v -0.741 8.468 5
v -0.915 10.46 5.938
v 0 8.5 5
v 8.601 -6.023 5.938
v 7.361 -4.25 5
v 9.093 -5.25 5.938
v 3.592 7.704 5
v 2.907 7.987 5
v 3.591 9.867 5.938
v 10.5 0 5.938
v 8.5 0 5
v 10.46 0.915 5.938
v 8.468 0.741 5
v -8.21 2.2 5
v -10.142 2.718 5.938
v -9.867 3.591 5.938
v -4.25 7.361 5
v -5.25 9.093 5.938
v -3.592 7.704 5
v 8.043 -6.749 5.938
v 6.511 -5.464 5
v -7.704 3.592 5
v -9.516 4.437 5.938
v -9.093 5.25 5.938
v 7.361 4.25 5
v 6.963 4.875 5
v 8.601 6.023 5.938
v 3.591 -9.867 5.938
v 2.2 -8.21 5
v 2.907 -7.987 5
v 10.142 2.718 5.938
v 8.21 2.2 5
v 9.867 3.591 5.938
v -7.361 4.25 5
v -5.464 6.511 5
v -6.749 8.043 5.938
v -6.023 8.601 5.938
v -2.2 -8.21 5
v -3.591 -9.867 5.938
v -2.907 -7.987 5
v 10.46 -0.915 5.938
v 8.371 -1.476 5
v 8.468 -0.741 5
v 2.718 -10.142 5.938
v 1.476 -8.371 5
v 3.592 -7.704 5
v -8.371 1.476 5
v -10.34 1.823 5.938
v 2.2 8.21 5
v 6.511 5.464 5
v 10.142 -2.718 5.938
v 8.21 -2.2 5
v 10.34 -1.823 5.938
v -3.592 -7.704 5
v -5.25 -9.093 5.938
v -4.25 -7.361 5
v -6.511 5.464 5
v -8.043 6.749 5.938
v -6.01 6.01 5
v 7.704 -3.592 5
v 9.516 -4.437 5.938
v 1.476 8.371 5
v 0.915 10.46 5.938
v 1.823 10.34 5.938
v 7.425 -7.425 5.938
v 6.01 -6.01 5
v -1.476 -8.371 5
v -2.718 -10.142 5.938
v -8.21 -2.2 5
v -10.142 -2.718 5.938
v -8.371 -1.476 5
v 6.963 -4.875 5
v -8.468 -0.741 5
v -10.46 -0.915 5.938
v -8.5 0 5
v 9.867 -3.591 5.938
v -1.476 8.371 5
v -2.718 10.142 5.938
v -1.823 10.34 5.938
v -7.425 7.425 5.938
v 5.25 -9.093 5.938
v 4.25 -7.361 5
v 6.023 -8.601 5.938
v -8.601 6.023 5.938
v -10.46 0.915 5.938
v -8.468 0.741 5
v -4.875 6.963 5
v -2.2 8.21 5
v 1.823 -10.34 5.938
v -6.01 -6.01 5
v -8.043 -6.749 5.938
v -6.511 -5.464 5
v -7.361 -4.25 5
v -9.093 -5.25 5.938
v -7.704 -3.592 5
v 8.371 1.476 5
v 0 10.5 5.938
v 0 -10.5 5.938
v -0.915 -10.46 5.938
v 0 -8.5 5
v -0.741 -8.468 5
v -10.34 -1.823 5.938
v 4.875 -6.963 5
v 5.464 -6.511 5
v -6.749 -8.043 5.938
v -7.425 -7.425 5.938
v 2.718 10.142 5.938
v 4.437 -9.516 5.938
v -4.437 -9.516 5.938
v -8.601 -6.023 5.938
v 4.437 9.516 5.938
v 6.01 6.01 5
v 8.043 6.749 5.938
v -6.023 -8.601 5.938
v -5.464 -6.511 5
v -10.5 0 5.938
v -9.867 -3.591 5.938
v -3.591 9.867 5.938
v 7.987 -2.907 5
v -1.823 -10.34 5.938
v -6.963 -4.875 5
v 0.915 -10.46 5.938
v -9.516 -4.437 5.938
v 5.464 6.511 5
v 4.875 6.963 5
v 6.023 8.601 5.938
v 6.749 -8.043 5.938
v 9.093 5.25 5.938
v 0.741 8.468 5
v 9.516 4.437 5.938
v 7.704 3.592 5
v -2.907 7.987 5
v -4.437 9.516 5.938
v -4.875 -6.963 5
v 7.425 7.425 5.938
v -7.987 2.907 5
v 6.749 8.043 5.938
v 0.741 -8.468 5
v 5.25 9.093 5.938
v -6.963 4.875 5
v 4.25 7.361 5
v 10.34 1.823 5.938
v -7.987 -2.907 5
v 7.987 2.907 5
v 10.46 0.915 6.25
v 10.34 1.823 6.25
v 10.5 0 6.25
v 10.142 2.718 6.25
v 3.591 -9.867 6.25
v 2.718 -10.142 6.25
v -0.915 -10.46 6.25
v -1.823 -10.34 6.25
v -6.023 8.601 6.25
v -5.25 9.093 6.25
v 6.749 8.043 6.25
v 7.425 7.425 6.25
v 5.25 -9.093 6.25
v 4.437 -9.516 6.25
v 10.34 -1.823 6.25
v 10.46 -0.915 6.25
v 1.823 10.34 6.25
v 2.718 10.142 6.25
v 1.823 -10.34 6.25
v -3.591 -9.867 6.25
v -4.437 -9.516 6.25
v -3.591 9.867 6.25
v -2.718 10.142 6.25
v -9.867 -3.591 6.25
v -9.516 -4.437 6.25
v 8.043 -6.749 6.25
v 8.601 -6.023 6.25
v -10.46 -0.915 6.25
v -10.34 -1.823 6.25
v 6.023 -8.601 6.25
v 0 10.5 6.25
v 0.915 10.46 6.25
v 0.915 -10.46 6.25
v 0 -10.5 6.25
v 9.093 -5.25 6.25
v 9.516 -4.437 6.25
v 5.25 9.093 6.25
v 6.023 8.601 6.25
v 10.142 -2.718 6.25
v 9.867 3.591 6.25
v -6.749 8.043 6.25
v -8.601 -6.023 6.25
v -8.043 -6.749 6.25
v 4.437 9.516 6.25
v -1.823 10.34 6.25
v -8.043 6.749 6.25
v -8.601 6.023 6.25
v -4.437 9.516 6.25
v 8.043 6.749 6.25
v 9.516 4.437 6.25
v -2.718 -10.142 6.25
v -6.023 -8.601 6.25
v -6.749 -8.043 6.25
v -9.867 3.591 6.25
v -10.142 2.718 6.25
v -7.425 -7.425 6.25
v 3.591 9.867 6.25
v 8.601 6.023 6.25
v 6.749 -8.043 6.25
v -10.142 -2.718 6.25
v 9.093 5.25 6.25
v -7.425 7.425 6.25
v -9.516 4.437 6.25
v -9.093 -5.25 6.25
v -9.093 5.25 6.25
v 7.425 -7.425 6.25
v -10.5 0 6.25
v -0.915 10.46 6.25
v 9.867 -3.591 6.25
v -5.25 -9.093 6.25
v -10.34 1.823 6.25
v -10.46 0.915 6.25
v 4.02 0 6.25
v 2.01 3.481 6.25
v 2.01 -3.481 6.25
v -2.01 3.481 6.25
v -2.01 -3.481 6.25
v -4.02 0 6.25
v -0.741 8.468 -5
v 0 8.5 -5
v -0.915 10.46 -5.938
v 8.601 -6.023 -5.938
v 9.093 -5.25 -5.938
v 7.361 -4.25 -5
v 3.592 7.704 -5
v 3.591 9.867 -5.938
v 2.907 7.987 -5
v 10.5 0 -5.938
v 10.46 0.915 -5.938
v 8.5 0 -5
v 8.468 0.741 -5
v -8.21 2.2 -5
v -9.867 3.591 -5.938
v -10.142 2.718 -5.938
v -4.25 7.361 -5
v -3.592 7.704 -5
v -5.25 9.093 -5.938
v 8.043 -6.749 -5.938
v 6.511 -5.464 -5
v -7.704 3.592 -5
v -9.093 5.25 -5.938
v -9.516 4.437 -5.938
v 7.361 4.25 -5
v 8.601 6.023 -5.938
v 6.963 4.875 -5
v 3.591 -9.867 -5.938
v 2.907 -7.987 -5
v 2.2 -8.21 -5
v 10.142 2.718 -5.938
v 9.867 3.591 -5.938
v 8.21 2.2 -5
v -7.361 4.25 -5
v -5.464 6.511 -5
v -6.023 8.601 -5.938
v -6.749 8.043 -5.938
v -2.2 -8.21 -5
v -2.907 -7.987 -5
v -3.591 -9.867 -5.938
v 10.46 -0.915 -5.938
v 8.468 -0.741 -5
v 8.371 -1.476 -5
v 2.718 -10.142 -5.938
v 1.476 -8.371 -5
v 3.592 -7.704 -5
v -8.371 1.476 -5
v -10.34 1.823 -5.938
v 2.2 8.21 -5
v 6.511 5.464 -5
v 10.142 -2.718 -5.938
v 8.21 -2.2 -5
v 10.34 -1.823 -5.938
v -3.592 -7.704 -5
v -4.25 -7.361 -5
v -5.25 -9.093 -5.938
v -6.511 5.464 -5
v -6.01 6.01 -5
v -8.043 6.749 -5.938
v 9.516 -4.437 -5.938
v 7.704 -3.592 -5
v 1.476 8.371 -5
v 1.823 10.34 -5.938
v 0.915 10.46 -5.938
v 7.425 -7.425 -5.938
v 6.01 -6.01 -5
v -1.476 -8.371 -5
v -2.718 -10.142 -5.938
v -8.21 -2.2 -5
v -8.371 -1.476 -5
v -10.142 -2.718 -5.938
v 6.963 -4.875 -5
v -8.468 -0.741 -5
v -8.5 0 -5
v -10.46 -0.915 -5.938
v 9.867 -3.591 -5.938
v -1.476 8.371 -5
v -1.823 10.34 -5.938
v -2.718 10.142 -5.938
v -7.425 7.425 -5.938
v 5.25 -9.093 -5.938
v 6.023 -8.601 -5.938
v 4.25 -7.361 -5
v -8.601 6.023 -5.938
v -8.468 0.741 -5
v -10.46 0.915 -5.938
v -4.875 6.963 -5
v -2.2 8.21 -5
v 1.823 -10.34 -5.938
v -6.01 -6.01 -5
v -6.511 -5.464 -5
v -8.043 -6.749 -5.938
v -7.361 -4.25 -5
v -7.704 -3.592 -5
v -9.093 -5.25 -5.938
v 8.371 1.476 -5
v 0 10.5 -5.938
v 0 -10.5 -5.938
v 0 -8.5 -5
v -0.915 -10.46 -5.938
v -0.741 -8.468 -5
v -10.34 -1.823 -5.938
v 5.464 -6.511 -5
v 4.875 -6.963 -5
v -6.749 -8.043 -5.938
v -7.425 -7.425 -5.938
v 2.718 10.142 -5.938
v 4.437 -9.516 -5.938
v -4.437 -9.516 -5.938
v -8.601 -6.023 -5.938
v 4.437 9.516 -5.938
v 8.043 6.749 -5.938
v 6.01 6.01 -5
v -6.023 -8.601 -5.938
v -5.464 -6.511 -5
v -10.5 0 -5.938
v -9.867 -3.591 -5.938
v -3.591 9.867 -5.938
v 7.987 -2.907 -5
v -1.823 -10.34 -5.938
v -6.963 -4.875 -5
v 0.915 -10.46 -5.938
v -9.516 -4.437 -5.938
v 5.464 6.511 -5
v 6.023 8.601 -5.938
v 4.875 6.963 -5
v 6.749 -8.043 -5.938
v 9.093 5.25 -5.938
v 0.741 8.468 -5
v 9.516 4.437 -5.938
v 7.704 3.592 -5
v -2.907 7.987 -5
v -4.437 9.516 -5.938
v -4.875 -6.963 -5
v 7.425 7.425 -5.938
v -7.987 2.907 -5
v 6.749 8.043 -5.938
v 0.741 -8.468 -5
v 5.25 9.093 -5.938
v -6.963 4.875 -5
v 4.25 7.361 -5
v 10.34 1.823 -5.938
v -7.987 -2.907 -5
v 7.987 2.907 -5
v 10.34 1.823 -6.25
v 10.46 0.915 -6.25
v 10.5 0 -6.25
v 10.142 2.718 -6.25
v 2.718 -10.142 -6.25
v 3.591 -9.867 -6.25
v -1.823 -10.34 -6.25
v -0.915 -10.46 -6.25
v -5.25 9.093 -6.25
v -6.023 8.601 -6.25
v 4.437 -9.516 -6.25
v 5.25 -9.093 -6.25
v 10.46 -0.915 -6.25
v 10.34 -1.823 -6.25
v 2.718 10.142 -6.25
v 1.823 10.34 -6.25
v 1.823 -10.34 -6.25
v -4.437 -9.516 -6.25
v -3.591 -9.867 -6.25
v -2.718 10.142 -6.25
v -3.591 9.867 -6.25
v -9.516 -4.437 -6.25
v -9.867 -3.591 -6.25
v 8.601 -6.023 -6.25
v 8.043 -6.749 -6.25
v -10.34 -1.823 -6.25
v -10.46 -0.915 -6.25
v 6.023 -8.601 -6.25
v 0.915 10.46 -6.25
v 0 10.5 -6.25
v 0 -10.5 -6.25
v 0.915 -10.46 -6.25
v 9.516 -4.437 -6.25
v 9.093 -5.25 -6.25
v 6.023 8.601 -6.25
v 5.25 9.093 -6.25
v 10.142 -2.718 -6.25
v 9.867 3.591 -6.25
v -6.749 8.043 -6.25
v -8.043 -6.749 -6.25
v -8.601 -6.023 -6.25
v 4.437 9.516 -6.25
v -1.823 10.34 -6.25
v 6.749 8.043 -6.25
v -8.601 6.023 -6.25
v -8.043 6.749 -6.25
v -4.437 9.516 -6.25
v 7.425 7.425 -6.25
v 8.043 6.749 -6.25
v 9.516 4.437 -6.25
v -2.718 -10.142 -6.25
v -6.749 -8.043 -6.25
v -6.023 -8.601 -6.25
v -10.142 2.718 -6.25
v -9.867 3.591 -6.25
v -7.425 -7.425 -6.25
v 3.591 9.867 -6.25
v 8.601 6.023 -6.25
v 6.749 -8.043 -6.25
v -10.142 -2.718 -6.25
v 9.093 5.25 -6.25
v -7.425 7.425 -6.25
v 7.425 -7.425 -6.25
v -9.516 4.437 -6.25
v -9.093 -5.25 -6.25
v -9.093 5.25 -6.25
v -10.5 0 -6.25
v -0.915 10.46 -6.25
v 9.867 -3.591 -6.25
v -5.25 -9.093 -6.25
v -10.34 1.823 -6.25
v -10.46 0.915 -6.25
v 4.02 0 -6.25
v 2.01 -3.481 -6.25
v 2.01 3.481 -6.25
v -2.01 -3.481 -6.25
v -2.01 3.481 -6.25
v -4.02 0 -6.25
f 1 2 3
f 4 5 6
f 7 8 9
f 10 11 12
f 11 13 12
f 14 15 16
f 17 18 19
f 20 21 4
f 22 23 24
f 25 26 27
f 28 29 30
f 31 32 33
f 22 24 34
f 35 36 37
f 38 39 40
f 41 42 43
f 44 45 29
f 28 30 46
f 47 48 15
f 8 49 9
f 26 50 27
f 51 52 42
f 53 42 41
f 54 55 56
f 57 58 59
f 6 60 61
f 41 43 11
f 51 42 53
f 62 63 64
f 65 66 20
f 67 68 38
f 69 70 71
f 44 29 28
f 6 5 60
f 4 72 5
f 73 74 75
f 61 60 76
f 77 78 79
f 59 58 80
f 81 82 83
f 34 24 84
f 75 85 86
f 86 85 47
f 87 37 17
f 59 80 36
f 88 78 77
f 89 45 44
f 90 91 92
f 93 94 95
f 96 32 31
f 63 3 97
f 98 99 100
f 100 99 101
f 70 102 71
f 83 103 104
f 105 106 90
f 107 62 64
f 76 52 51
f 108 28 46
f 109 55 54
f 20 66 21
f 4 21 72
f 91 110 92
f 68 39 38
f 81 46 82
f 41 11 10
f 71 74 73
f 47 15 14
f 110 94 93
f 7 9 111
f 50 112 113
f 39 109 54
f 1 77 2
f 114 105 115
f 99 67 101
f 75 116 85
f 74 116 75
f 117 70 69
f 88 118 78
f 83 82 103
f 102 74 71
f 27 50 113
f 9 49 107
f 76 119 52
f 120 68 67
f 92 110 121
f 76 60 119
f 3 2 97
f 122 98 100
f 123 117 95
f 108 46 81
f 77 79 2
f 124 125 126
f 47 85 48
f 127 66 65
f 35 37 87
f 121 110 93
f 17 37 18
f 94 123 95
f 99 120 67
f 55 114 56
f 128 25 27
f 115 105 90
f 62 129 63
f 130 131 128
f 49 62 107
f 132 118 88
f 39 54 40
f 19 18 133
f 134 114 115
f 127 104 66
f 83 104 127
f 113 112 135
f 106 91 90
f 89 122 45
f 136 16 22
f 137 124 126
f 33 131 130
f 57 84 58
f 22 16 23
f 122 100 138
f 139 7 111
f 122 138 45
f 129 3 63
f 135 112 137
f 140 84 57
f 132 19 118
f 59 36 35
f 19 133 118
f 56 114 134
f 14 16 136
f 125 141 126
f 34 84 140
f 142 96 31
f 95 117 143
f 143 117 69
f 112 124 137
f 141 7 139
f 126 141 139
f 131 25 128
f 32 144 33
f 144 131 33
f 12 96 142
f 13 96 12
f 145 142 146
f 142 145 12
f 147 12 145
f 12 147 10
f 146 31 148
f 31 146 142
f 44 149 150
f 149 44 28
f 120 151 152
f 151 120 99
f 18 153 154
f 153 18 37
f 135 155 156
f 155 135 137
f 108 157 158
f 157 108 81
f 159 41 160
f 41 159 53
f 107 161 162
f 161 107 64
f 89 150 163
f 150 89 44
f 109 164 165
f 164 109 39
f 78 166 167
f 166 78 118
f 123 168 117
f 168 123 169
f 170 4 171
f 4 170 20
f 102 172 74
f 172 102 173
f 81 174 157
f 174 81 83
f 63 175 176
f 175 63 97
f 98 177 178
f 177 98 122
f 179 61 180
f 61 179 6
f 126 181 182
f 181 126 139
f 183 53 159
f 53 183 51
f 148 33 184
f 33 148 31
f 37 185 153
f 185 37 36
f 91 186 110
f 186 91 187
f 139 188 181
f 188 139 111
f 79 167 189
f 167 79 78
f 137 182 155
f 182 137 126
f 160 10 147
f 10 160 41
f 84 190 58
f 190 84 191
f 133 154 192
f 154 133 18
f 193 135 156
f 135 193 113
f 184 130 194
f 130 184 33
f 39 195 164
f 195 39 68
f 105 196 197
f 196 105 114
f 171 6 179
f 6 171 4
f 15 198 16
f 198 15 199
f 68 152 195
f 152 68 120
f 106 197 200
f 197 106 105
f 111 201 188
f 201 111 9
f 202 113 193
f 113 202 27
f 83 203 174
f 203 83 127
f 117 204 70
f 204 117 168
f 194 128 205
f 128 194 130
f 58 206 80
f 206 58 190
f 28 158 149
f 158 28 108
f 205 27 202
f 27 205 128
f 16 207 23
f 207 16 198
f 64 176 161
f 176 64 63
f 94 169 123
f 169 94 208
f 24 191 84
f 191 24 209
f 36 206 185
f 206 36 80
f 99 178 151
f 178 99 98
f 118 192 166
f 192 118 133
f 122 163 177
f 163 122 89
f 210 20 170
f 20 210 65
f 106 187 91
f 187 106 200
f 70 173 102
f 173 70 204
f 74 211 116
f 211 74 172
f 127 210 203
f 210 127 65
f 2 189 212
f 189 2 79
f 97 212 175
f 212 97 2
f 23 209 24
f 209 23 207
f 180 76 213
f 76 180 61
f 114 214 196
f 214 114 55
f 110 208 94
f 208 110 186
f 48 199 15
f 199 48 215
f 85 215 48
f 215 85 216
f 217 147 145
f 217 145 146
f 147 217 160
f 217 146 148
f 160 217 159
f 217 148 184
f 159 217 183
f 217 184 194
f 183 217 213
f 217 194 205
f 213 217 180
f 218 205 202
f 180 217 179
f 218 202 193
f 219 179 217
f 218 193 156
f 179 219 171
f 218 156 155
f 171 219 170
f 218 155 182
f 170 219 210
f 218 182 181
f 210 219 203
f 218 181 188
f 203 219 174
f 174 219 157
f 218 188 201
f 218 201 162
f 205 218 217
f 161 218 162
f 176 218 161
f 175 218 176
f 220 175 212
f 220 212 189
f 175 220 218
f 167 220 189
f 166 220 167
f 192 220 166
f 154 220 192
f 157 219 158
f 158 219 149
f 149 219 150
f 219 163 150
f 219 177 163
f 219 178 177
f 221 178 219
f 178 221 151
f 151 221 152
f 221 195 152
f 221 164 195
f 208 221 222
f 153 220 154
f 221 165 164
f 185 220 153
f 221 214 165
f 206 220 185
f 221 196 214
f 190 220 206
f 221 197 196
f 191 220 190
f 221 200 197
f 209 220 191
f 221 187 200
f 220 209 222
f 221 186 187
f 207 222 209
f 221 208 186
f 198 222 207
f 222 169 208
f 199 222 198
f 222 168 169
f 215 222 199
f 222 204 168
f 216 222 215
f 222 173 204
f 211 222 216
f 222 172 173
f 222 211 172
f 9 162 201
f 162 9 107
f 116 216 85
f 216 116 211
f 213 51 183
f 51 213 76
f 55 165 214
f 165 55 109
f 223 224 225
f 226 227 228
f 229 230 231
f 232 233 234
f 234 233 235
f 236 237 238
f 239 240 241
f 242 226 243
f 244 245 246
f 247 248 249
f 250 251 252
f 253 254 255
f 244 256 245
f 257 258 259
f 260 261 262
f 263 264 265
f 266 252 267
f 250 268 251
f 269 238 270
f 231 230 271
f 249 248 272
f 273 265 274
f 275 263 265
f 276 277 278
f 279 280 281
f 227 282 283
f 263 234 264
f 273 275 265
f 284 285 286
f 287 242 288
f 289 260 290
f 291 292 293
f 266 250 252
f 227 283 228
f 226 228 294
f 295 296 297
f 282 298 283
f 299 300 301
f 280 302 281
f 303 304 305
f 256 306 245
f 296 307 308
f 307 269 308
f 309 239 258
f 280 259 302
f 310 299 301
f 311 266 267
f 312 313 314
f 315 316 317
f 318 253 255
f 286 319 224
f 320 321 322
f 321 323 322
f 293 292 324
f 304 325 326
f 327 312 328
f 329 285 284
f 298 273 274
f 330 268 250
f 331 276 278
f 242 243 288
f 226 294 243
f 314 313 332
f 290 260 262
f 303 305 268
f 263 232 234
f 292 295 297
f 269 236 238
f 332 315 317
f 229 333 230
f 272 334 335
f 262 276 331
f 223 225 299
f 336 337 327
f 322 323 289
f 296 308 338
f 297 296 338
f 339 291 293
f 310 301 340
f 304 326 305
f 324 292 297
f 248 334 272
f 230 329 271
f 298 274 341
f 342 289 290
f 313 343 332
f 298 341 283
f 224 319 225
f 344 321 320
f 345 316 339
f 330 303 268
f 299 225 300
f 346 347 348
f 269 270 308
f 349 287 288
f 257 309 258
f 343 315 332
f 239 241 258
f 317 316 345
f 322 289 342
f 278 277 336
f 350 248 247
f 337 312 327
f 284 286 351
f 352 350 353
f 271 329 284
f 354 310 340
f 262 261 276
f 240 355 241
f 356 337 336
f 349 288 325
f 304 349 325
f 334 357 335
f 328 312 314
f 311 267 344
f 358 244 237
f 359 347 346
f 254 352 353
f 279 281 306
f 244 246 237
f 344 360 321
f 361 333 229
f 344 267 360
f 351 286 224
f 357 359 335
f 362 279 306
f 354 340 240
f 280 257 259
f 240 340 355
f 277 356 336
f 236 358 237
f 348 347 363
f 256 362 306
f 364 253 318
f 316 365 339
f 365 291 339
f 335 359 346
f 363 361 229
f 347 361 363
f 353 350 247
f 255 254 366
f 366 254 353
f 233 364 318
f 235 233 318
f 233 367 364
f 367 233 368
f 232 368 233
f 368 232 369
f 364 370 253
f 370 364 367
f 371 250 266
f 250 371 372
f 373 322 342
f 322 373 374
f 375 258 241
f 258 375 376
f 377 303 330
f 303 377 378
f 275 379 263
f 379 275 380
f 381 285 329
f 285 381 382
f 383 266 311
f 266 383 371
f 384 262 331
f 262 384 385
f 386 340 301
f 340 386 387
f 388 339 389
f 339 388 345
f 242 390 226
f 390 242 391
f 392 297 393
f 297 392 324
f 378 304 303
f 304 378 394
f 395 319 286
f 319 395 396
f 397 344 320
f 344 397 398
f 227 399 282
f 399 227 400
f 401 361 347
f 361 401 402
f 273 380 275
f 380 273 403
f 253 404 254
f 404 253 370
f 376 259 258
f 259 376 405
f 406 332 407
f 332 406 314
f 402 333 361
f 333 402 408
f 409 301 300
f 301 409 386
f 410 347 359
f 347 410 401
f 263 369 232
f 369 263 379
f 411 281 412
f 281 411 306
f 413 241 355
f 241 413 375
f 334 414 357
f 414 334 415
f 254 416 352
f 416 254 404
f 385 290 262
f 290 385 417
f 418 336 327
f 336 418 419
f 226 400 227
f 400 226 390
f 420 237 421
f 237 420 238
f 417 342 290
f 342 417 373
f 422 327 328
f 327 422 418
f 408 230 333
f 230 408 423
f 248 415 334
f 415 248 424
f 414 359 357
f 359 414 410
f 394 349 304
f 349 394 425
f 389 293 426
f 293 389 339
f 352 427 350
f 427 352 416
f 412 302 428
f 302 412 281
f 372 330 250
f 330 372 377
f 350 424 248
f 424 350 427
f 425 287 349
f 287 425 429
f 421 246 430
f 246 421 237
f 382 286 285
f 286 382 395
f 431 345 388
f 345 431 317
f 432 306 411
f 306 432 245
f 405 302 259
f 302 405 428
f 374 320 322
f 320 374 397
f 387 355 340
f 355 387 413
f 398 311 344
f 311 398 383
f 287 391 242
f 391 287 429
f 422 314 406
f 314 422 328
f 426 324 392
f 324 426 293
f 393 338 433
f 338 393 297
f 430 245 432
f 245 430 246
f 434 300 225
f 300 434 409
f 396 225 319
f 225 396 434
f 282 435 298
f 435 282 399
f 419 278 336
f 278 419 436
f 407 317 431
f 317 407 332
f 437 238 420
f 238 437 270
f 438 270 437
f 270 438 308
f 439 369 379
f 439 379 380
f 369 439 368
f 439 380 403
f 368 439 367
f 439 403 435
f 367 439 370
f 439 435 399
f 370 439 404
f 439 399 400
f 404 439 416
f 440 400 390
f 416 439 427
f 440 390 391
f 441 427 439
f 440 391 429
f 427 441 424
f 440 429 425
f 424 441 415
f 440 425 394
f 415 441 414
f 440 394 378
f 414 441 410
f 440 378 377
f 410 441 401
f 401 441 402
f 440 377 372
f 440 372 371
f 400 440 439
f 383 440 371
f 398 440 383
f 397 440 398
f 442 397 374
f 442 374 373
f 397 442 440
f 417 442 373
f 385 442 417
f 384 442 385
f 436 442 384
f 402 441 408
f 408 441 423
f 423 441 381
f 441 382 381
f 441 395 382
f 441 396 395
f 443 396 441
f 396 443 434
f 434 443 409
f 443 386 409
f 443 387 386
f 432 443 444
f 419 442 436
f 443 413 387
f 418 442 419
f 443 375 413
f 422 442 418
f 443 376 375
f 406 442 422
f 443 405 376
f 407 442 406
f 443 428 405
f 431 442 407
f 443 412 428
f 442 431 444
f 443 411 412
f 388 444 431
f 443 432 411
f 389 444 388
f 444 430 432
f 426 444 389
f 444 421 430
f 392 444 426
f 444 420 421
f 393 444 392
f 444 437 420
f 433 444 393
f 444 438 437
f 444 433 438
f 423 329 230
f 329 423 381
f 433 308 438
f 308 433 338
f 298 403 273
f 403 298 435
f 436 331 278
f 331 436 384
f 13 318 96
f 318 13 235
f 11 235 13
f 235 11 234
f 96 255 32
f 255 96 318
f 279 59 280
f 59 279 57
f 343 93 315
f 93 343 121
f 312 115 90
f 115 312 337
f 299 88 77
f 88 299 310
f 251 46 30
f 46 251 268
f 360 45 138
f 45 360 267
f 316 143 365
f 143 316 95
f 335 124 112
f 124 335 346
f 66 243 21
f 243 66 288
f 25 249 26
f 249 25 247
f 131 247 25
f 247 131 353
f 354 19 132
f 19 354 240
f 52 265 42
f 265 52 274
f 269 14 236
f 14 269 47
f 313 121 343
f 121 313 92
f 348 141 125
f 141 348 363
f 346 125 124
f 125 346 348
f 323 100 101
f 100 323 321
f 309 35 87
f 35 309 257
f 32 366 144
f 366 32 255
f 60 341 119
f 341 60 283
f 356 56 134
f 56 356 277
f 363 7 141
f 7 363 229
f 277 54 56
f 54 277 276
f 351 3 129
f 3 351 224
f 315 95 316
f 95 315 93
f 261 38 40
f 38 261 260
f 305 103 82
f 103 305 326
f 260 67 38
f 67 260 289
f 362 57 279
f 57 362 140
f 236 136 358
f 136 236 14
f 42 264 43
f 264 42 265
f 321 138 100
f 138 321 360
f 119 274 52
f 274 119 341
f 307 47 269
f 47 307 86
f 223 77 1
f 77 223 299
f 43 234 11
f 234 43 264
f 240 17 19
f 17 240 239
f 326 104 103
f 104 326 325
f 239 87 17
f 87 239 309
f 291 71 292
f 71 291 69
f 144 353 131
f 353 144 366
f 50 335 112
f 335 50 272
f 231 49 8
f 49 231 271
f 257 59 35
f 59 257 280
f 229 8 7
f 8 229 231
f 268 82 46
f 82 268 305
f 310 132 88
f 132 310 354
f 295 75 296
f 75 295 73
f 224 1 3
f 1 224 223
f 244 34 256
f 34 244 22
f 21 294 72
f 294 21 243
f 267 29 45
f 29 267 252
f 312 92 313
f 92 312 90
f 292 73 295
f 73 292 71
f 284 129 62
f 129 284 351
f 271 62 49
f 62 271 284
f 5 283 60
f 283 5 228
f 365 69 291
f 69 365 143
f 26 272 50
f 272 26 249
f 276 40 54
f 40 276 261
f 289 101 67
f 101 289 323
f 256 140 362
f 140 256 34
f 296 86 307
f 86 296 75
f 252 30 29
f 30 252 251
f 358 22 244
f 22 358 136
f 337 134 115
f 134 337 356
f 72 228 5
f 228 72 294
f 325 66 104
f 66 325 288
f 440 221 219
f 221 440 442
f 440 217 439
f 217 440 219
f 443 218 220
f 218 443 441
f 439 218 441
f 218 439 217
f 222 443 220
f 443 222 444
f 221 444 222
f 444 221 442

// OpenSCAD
// file: Hardware.scad
// Dimensions of metal bits

bearing_od = 22.00 - 0.04;  // Interference fit!
bearing_id = 8.00;
bearing_depth = 7;


// TODO Need an offset more than a scale factor, for small stuff!
nail_16d_diam = 4.16;  // Drill #19 for moderately loose.
nail_6d_diam = 2.92;    // Drill #32 for moderately loose. Add .05 for moderately loose.

m5_male_dia = 4.92;  // Drill #12 D_maj - H/4 = D_maj - .2165 P
m5_minor_dia = 5 * 1.08253*0.8; // 4.13 = (D_maj - 1.25*0.866*P)
m5_nut_dia = 7.89;  // hex flats
m5_boss_diam = 12;
m5_boss_thick = 6;
m5_nut_recess = 3.7 + 0.2;  // nut thickness
m5_spacer_diam = 9;
// file: Locations.scad
include <Hardware.scad>

movemt_corner_holes = [
    [-40, +97],         // upper left
    [+40, +72],         // upper right        
    [+40, -10],         // lower right
    [-40, -10],         // lower left
];

movemt_corner_holes_diam = [
    m5_male_dia,m5_male_dia,
    m5_male_dia,m5_male_dia,
];

outer_corner_holes = [
    [-60, +122],        // upper left
    [+60, +122],        // upper right        
    [+60, -23],         // lower right
    [-60, -23],         // lower left
];
outer_corner_holes_diam = [
    m5_male_dia,m5_male_dia,
    m5_male_dia,m5_male_dia,
];


// For all frame components
thick = 2.5;
arm_width = 8;
bearing_boss_diam = 32;
minshaft_bore_diam = 8.01;  // Loose fit!
minshaft_boss_diam = 16;
girder_thick = 1.2; // six layers at 0.2mm/layer
small_arm_width = 5;  // For small girders
small_arm_height = 4;

// Ratchet, barrel,pulley arbor, face frame
barrel_bore_diam = 10;
pulley_hex_diam = 8;

// Quality settings
$fs = 0.5;
$fa = 5;
// main file
include <Locations.scad>

pulley_height = 12.5; // Available in frame
flange_height = 1.25;
arbor_height = pulley_height - 2 * flange_height;
flange_diam = 21;
arbor_diam = 17;


module flange()
{
    slope_height = flange_height * 3/4;
    lip_height = flange_height - slope_height;
    z = arbor_height / 2;
    translate([0,0,z])
    // Slope
    cylinder(h=slope_height, d1=arbor_diam, d2=flange_diam);
    // Strengthen outer face
    translate([0,0,z + slope_height])
    cylinder(h=lip_height, d1=flange_diam, d2=flange_diam);
}

module pulley()
{
    flange();

    scale([1,1,-1])  // Mirror
    flange();

    // Arbor
    cylinder(d=arbor_diam, h=arbor_height, center=true);

    //// Boss
    //translate([0,0,pulley_height/2])
    //cylinder(h=.2, d=bearing_id+3);
}

difference()
{
    pulley();
    
    // Hex bore for pulley/ratchet arbor
    cylinder(h=3*pulley_height, d=pulley_hex_diam+.04, $fn=6, center=true);
}
